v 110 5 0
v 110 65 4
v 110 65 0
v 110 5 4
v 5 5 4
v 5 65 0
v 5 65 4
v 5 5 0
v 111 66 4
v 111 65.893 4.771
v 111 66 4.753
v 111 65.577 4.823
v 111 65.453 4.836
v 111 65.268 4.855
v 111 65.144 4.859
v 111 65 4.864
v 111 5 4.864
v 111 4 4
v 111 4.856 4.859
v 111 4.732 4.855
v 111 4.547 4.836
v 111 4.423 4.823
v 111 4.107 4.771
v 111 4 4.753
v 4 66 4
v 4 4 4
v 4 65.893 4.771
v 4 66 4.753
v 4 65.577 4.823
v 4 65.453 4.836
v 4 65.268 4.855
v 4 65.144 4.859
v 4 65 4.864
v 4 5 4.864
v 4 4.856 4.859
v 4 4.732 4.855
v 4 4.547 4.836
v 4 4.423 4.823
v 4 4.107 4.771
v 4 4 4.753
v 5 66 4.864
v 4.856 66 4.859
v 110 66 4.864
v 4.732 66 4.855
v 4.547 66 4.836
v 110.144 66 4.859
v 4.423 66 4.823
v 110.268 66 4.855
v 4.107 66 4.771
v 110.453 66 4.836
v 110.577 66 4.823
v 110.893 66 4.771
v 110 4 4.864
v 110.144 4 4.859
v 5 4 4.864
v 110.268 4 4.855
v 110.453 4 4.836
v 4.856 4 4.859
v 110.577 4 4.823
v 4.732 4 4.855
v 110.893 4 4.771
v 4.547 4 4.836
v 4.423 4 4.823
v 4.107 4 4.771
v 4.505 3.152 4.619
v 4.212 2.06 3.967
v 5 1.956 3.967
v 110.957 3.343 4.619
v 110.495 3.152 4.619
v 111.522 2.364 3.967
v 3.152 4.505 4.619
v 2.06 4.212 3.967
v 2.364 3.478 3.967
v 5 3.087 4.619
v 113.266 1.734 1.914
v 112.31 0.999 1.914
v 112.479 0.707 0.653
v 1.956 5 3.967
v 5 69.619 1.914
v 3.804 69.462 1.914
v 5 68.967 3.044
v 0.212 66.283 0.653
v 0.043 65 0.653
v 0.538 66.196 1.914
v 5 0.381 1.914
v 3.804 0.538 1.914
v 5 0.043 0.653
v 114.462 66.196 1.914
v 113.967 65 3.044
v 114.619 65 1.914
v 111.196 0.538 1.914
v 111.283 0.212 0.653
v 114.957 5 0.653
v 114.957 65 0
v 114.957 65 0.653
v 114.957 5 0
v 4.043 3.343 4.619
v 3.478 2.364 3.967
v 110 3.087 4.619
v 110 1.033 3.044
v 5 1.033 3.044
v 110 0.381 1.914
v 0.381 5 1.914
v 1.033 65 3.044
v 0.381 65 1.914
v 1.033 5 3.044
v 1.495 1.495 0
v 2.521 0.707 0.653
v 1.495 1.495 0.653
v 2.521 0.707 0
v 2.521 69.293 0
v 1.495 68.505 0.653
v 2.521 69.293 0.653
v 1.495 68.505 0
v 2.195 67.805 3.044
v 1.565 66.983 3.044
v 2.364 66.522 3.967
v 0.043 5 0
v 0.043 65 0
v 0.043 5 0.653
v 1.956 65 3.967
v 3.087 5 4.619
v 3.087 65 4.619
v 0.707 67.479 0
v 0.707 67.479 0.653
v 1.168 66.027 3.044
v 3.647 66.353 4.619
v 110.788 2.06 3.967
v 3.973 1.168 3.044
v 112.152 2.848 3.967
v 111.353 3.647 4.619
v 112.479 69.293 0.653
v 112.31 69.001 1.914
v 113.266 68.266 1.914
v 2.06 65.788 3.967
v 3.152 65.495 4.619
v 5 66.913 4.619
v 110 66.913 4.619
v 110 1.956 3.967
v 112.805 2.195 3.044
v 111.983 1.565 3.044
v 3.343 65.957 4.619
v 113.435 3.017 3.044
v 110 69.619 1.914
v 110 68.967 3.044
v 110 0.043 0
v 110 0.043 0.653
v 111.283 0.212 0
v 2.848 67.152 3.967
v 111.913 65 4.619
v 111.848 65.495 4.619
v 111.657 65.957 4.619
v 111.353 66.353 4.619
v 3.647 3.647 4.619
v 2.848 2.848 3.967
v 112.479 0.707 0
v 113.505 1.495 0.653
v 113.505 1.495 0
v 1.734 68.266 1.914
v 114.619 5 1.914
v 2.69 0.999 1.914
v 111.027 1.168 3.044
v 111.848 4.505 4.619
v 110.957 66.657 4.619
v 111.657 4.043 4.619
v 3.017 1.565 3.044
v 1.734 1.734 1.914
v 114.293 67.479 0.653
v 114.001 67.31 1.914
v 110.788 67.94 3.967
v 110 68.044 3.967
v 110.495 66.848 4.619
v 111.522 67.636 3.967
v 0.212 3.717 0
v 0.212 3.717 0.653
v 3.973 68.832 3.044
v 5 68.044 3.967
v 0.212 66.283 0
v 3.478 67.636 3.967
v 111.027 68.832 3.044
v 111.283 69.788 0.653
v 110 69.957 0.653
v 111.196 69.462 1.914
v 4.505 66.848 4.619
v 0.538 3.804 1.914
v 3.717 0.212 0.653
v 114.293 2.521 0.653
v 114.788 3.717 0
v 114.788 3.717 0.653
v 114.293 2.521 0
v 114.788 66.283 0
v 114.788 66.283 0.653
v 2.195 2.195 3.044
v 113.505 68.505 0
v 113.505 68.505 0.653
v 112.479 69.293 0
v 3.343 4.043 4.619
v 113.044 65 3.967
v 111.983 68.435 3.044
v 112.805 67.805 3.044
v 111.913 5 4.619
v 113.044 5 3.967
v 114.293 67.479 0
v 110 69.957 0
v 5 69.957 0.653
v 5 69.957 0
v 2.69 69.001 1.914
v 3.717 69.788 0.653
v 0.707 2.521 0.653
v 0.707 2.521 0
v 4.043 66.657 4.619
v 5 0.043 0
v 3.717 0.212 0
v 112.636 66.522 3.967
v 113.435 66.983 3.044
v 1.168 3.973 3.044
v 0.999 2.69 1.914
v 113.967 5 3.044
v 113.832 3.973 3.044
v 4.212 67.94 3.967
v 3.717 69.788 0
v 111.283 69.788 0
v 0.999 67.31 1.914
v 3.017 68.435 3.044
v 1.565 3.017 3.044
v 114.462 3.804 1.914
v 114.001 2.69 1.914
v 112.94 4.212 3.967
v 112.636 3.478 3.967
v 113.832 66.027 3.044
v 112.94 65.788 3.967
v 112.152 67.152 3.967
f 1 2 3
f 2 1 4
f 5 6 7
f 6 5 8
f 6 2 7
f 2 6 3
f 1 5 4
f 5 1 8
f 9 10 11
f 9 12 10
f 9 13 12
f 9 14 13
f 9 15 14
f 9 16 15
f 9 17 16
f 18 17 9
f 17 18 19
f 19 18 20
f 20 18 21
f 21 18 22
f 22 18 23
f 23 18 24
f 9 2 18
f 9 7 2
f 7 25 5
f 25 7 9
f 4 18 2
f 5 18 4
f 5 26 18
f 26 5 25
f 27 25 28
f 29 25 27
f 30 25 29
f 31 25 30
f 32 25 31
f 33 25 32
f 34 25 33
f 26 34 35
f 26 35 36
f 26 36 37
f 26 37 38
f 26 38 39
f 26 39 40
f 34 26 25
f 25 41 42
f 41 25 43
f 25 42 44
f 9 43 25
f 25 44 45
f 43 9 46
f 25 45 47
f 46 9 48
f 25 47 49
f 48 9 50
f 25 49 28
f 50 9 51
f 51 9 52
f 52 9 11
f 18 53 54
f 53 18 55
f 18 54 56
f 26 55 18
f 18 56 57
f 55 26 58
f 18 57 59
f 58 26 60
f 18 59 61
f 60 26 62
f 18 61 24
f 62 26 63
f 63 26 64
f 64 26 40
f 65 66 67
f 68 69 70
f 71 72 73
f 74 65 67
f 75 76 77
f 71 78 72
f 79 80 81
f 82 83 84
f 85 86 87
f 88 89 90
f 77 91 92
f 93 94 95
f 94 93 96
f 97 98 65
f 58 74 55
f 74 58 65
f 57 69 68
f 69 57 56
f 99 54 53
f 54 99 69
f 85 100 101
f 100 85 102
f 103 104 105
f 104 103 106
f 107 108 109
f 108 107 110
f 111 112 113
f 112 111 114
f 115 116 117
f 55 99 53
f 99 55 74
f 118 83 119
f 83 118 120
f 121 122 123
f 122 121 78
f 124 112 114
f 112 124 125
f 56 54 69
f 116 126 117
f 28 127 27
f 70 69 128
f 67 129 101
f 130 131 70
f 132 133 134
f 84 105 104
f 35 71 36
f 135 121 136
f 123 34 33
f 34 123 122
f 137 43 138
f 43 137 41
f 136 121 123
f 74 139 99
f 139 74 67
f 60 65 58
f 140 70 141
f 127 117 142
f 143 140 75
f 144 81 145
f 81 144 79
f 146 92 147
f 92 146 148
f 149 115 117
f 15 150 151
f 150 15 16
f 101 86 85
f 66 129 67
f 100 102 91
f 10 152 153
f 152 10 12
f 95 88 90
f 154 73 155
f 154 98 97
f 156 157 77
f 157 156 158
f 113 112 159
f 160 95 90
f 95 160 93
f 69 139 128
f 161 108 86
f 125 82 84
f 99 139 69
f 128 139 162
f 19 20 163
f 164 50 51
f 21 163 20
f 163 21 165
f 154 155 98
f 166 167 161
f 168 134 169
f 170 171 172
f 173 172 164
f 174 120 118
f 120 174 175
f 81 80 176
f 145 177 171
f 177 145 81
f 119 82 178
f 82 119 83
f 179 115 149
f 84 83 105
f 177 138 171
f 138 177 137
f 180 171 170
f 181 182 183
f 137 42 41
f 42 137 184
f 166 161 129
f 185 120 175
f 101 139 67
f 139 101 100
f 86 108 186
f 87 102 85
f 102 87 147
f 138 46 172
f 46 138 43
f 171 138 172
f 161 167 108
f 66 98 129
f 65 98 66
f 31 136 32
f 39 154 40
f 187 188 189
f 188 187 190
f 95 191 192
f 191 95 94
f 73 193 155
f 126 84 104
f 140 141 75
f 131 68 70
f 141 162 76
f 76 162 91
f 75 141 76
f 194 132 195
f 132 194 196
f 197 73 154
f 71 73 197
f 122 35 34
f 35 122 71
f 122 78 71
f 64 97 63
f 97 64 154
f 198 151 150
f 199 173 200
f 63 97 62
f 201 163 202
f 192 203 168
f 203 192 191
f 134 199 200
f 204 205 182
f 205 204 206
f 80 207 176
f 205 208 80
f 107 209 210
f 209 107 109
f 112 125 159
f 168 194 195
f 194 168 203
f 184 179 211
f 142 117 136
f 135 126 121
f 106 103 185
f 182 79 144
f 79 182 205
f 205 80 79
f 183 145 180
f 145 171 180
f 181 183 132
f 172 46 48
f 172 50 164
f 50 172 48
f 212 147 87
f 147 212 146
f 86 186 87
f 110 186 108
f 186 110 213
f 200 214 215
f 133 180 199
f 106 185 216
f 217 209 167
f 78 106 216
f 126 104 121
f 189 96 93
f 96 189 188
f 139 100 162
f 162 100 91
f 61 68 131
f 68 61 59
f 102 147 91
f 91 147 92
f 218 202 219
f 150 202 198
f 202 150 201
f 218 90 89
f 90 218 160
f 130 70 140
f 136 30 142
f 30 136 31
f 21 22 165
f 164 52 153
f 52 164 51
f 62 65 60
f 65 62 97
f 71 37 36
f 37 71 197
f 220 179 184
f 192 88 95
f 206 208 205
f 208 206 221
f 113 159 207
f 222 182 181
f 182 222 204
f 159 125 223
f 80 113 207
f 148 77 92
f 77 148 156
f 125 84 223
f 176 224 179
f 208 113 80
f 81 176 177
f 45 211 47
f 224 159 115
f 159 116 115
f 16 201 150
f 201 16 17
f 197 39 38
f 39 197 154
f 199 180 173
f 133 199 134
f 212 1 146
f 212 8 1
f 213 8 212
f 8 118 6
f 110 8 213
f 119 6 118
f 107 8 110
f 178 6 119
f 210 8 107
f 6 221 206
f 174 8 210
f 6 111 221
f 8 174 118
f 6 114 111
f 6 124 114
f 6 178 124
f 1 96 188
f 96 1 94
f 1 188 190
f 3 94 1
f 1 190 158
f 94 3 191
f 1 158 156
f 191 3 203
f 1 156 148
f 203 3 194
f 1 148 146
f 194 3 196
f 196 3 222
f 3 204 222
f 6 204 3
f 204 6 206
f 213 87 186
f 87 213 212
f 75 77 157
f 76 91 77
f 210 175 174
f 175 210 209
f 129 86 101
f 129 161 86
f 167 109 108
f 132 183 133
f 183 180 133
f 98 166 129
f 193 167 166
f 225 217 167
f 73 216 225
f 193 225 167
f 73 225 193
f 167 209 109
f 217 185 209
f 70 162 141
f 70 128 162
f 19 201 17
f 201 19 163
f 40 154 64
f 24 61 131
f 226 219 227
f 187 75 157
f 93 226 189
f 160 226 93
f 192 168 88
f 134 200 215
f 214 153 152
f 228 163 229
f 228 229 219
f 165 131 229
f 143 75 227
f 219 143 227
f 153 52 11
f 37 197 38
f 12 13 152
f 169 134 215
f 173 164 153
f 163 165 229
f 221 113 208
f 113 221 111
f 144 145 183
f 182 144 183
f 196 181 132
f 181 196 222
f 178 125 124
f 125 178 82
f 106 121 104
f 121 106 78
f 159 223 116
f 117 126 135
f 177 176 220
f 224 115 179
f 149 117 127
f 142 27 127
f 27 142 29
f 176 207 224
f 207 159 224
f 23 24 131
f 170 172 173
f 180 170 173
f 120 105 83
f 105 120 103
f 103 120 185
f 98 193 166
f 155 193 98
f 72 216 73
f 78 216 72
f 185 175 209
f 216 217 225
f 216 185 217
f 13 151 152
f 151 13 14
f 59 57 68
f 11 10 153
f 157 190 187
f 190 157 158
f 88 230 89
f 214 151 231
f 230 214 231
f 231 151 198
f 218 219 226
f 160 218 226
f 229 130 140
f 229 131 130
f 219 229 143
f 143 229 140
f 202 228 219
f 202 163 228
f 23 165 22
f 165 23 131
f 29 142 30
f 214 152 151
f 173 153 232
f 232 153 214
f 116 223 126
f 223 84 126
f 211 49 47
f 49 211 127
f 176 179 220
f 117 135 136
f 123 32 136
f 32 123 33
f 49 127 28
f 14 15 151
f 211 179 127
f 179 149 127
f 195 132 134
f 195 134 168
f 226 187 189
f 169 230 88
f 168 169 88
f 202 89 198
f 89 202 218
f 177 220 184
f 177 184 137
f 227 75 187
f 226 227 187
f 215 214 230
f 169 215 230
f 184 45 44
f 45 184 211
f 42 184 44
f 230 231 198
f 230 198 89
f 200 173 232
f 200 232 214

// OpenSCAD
union() {
	difference() {
		translate(v = [5, 5, 0]) {
			minkowski() {
				cube(size = [105, 60, 0.0001000000]);
				difference() {
					sphere($fn = 24, r = 5);
					translate(v = [-5, -5, -5]) {
						cube(size = [10, 10, 5]);
					}
				}
			}
		}
		union() {
			translate(v = [5, 5, -1]) {
				cube(size = [105, 60, 10]);
			}
			translate(v = [4, 4, 4]) {
				cube(size = [107, 62, 10]);
			}
		}
	}
}
